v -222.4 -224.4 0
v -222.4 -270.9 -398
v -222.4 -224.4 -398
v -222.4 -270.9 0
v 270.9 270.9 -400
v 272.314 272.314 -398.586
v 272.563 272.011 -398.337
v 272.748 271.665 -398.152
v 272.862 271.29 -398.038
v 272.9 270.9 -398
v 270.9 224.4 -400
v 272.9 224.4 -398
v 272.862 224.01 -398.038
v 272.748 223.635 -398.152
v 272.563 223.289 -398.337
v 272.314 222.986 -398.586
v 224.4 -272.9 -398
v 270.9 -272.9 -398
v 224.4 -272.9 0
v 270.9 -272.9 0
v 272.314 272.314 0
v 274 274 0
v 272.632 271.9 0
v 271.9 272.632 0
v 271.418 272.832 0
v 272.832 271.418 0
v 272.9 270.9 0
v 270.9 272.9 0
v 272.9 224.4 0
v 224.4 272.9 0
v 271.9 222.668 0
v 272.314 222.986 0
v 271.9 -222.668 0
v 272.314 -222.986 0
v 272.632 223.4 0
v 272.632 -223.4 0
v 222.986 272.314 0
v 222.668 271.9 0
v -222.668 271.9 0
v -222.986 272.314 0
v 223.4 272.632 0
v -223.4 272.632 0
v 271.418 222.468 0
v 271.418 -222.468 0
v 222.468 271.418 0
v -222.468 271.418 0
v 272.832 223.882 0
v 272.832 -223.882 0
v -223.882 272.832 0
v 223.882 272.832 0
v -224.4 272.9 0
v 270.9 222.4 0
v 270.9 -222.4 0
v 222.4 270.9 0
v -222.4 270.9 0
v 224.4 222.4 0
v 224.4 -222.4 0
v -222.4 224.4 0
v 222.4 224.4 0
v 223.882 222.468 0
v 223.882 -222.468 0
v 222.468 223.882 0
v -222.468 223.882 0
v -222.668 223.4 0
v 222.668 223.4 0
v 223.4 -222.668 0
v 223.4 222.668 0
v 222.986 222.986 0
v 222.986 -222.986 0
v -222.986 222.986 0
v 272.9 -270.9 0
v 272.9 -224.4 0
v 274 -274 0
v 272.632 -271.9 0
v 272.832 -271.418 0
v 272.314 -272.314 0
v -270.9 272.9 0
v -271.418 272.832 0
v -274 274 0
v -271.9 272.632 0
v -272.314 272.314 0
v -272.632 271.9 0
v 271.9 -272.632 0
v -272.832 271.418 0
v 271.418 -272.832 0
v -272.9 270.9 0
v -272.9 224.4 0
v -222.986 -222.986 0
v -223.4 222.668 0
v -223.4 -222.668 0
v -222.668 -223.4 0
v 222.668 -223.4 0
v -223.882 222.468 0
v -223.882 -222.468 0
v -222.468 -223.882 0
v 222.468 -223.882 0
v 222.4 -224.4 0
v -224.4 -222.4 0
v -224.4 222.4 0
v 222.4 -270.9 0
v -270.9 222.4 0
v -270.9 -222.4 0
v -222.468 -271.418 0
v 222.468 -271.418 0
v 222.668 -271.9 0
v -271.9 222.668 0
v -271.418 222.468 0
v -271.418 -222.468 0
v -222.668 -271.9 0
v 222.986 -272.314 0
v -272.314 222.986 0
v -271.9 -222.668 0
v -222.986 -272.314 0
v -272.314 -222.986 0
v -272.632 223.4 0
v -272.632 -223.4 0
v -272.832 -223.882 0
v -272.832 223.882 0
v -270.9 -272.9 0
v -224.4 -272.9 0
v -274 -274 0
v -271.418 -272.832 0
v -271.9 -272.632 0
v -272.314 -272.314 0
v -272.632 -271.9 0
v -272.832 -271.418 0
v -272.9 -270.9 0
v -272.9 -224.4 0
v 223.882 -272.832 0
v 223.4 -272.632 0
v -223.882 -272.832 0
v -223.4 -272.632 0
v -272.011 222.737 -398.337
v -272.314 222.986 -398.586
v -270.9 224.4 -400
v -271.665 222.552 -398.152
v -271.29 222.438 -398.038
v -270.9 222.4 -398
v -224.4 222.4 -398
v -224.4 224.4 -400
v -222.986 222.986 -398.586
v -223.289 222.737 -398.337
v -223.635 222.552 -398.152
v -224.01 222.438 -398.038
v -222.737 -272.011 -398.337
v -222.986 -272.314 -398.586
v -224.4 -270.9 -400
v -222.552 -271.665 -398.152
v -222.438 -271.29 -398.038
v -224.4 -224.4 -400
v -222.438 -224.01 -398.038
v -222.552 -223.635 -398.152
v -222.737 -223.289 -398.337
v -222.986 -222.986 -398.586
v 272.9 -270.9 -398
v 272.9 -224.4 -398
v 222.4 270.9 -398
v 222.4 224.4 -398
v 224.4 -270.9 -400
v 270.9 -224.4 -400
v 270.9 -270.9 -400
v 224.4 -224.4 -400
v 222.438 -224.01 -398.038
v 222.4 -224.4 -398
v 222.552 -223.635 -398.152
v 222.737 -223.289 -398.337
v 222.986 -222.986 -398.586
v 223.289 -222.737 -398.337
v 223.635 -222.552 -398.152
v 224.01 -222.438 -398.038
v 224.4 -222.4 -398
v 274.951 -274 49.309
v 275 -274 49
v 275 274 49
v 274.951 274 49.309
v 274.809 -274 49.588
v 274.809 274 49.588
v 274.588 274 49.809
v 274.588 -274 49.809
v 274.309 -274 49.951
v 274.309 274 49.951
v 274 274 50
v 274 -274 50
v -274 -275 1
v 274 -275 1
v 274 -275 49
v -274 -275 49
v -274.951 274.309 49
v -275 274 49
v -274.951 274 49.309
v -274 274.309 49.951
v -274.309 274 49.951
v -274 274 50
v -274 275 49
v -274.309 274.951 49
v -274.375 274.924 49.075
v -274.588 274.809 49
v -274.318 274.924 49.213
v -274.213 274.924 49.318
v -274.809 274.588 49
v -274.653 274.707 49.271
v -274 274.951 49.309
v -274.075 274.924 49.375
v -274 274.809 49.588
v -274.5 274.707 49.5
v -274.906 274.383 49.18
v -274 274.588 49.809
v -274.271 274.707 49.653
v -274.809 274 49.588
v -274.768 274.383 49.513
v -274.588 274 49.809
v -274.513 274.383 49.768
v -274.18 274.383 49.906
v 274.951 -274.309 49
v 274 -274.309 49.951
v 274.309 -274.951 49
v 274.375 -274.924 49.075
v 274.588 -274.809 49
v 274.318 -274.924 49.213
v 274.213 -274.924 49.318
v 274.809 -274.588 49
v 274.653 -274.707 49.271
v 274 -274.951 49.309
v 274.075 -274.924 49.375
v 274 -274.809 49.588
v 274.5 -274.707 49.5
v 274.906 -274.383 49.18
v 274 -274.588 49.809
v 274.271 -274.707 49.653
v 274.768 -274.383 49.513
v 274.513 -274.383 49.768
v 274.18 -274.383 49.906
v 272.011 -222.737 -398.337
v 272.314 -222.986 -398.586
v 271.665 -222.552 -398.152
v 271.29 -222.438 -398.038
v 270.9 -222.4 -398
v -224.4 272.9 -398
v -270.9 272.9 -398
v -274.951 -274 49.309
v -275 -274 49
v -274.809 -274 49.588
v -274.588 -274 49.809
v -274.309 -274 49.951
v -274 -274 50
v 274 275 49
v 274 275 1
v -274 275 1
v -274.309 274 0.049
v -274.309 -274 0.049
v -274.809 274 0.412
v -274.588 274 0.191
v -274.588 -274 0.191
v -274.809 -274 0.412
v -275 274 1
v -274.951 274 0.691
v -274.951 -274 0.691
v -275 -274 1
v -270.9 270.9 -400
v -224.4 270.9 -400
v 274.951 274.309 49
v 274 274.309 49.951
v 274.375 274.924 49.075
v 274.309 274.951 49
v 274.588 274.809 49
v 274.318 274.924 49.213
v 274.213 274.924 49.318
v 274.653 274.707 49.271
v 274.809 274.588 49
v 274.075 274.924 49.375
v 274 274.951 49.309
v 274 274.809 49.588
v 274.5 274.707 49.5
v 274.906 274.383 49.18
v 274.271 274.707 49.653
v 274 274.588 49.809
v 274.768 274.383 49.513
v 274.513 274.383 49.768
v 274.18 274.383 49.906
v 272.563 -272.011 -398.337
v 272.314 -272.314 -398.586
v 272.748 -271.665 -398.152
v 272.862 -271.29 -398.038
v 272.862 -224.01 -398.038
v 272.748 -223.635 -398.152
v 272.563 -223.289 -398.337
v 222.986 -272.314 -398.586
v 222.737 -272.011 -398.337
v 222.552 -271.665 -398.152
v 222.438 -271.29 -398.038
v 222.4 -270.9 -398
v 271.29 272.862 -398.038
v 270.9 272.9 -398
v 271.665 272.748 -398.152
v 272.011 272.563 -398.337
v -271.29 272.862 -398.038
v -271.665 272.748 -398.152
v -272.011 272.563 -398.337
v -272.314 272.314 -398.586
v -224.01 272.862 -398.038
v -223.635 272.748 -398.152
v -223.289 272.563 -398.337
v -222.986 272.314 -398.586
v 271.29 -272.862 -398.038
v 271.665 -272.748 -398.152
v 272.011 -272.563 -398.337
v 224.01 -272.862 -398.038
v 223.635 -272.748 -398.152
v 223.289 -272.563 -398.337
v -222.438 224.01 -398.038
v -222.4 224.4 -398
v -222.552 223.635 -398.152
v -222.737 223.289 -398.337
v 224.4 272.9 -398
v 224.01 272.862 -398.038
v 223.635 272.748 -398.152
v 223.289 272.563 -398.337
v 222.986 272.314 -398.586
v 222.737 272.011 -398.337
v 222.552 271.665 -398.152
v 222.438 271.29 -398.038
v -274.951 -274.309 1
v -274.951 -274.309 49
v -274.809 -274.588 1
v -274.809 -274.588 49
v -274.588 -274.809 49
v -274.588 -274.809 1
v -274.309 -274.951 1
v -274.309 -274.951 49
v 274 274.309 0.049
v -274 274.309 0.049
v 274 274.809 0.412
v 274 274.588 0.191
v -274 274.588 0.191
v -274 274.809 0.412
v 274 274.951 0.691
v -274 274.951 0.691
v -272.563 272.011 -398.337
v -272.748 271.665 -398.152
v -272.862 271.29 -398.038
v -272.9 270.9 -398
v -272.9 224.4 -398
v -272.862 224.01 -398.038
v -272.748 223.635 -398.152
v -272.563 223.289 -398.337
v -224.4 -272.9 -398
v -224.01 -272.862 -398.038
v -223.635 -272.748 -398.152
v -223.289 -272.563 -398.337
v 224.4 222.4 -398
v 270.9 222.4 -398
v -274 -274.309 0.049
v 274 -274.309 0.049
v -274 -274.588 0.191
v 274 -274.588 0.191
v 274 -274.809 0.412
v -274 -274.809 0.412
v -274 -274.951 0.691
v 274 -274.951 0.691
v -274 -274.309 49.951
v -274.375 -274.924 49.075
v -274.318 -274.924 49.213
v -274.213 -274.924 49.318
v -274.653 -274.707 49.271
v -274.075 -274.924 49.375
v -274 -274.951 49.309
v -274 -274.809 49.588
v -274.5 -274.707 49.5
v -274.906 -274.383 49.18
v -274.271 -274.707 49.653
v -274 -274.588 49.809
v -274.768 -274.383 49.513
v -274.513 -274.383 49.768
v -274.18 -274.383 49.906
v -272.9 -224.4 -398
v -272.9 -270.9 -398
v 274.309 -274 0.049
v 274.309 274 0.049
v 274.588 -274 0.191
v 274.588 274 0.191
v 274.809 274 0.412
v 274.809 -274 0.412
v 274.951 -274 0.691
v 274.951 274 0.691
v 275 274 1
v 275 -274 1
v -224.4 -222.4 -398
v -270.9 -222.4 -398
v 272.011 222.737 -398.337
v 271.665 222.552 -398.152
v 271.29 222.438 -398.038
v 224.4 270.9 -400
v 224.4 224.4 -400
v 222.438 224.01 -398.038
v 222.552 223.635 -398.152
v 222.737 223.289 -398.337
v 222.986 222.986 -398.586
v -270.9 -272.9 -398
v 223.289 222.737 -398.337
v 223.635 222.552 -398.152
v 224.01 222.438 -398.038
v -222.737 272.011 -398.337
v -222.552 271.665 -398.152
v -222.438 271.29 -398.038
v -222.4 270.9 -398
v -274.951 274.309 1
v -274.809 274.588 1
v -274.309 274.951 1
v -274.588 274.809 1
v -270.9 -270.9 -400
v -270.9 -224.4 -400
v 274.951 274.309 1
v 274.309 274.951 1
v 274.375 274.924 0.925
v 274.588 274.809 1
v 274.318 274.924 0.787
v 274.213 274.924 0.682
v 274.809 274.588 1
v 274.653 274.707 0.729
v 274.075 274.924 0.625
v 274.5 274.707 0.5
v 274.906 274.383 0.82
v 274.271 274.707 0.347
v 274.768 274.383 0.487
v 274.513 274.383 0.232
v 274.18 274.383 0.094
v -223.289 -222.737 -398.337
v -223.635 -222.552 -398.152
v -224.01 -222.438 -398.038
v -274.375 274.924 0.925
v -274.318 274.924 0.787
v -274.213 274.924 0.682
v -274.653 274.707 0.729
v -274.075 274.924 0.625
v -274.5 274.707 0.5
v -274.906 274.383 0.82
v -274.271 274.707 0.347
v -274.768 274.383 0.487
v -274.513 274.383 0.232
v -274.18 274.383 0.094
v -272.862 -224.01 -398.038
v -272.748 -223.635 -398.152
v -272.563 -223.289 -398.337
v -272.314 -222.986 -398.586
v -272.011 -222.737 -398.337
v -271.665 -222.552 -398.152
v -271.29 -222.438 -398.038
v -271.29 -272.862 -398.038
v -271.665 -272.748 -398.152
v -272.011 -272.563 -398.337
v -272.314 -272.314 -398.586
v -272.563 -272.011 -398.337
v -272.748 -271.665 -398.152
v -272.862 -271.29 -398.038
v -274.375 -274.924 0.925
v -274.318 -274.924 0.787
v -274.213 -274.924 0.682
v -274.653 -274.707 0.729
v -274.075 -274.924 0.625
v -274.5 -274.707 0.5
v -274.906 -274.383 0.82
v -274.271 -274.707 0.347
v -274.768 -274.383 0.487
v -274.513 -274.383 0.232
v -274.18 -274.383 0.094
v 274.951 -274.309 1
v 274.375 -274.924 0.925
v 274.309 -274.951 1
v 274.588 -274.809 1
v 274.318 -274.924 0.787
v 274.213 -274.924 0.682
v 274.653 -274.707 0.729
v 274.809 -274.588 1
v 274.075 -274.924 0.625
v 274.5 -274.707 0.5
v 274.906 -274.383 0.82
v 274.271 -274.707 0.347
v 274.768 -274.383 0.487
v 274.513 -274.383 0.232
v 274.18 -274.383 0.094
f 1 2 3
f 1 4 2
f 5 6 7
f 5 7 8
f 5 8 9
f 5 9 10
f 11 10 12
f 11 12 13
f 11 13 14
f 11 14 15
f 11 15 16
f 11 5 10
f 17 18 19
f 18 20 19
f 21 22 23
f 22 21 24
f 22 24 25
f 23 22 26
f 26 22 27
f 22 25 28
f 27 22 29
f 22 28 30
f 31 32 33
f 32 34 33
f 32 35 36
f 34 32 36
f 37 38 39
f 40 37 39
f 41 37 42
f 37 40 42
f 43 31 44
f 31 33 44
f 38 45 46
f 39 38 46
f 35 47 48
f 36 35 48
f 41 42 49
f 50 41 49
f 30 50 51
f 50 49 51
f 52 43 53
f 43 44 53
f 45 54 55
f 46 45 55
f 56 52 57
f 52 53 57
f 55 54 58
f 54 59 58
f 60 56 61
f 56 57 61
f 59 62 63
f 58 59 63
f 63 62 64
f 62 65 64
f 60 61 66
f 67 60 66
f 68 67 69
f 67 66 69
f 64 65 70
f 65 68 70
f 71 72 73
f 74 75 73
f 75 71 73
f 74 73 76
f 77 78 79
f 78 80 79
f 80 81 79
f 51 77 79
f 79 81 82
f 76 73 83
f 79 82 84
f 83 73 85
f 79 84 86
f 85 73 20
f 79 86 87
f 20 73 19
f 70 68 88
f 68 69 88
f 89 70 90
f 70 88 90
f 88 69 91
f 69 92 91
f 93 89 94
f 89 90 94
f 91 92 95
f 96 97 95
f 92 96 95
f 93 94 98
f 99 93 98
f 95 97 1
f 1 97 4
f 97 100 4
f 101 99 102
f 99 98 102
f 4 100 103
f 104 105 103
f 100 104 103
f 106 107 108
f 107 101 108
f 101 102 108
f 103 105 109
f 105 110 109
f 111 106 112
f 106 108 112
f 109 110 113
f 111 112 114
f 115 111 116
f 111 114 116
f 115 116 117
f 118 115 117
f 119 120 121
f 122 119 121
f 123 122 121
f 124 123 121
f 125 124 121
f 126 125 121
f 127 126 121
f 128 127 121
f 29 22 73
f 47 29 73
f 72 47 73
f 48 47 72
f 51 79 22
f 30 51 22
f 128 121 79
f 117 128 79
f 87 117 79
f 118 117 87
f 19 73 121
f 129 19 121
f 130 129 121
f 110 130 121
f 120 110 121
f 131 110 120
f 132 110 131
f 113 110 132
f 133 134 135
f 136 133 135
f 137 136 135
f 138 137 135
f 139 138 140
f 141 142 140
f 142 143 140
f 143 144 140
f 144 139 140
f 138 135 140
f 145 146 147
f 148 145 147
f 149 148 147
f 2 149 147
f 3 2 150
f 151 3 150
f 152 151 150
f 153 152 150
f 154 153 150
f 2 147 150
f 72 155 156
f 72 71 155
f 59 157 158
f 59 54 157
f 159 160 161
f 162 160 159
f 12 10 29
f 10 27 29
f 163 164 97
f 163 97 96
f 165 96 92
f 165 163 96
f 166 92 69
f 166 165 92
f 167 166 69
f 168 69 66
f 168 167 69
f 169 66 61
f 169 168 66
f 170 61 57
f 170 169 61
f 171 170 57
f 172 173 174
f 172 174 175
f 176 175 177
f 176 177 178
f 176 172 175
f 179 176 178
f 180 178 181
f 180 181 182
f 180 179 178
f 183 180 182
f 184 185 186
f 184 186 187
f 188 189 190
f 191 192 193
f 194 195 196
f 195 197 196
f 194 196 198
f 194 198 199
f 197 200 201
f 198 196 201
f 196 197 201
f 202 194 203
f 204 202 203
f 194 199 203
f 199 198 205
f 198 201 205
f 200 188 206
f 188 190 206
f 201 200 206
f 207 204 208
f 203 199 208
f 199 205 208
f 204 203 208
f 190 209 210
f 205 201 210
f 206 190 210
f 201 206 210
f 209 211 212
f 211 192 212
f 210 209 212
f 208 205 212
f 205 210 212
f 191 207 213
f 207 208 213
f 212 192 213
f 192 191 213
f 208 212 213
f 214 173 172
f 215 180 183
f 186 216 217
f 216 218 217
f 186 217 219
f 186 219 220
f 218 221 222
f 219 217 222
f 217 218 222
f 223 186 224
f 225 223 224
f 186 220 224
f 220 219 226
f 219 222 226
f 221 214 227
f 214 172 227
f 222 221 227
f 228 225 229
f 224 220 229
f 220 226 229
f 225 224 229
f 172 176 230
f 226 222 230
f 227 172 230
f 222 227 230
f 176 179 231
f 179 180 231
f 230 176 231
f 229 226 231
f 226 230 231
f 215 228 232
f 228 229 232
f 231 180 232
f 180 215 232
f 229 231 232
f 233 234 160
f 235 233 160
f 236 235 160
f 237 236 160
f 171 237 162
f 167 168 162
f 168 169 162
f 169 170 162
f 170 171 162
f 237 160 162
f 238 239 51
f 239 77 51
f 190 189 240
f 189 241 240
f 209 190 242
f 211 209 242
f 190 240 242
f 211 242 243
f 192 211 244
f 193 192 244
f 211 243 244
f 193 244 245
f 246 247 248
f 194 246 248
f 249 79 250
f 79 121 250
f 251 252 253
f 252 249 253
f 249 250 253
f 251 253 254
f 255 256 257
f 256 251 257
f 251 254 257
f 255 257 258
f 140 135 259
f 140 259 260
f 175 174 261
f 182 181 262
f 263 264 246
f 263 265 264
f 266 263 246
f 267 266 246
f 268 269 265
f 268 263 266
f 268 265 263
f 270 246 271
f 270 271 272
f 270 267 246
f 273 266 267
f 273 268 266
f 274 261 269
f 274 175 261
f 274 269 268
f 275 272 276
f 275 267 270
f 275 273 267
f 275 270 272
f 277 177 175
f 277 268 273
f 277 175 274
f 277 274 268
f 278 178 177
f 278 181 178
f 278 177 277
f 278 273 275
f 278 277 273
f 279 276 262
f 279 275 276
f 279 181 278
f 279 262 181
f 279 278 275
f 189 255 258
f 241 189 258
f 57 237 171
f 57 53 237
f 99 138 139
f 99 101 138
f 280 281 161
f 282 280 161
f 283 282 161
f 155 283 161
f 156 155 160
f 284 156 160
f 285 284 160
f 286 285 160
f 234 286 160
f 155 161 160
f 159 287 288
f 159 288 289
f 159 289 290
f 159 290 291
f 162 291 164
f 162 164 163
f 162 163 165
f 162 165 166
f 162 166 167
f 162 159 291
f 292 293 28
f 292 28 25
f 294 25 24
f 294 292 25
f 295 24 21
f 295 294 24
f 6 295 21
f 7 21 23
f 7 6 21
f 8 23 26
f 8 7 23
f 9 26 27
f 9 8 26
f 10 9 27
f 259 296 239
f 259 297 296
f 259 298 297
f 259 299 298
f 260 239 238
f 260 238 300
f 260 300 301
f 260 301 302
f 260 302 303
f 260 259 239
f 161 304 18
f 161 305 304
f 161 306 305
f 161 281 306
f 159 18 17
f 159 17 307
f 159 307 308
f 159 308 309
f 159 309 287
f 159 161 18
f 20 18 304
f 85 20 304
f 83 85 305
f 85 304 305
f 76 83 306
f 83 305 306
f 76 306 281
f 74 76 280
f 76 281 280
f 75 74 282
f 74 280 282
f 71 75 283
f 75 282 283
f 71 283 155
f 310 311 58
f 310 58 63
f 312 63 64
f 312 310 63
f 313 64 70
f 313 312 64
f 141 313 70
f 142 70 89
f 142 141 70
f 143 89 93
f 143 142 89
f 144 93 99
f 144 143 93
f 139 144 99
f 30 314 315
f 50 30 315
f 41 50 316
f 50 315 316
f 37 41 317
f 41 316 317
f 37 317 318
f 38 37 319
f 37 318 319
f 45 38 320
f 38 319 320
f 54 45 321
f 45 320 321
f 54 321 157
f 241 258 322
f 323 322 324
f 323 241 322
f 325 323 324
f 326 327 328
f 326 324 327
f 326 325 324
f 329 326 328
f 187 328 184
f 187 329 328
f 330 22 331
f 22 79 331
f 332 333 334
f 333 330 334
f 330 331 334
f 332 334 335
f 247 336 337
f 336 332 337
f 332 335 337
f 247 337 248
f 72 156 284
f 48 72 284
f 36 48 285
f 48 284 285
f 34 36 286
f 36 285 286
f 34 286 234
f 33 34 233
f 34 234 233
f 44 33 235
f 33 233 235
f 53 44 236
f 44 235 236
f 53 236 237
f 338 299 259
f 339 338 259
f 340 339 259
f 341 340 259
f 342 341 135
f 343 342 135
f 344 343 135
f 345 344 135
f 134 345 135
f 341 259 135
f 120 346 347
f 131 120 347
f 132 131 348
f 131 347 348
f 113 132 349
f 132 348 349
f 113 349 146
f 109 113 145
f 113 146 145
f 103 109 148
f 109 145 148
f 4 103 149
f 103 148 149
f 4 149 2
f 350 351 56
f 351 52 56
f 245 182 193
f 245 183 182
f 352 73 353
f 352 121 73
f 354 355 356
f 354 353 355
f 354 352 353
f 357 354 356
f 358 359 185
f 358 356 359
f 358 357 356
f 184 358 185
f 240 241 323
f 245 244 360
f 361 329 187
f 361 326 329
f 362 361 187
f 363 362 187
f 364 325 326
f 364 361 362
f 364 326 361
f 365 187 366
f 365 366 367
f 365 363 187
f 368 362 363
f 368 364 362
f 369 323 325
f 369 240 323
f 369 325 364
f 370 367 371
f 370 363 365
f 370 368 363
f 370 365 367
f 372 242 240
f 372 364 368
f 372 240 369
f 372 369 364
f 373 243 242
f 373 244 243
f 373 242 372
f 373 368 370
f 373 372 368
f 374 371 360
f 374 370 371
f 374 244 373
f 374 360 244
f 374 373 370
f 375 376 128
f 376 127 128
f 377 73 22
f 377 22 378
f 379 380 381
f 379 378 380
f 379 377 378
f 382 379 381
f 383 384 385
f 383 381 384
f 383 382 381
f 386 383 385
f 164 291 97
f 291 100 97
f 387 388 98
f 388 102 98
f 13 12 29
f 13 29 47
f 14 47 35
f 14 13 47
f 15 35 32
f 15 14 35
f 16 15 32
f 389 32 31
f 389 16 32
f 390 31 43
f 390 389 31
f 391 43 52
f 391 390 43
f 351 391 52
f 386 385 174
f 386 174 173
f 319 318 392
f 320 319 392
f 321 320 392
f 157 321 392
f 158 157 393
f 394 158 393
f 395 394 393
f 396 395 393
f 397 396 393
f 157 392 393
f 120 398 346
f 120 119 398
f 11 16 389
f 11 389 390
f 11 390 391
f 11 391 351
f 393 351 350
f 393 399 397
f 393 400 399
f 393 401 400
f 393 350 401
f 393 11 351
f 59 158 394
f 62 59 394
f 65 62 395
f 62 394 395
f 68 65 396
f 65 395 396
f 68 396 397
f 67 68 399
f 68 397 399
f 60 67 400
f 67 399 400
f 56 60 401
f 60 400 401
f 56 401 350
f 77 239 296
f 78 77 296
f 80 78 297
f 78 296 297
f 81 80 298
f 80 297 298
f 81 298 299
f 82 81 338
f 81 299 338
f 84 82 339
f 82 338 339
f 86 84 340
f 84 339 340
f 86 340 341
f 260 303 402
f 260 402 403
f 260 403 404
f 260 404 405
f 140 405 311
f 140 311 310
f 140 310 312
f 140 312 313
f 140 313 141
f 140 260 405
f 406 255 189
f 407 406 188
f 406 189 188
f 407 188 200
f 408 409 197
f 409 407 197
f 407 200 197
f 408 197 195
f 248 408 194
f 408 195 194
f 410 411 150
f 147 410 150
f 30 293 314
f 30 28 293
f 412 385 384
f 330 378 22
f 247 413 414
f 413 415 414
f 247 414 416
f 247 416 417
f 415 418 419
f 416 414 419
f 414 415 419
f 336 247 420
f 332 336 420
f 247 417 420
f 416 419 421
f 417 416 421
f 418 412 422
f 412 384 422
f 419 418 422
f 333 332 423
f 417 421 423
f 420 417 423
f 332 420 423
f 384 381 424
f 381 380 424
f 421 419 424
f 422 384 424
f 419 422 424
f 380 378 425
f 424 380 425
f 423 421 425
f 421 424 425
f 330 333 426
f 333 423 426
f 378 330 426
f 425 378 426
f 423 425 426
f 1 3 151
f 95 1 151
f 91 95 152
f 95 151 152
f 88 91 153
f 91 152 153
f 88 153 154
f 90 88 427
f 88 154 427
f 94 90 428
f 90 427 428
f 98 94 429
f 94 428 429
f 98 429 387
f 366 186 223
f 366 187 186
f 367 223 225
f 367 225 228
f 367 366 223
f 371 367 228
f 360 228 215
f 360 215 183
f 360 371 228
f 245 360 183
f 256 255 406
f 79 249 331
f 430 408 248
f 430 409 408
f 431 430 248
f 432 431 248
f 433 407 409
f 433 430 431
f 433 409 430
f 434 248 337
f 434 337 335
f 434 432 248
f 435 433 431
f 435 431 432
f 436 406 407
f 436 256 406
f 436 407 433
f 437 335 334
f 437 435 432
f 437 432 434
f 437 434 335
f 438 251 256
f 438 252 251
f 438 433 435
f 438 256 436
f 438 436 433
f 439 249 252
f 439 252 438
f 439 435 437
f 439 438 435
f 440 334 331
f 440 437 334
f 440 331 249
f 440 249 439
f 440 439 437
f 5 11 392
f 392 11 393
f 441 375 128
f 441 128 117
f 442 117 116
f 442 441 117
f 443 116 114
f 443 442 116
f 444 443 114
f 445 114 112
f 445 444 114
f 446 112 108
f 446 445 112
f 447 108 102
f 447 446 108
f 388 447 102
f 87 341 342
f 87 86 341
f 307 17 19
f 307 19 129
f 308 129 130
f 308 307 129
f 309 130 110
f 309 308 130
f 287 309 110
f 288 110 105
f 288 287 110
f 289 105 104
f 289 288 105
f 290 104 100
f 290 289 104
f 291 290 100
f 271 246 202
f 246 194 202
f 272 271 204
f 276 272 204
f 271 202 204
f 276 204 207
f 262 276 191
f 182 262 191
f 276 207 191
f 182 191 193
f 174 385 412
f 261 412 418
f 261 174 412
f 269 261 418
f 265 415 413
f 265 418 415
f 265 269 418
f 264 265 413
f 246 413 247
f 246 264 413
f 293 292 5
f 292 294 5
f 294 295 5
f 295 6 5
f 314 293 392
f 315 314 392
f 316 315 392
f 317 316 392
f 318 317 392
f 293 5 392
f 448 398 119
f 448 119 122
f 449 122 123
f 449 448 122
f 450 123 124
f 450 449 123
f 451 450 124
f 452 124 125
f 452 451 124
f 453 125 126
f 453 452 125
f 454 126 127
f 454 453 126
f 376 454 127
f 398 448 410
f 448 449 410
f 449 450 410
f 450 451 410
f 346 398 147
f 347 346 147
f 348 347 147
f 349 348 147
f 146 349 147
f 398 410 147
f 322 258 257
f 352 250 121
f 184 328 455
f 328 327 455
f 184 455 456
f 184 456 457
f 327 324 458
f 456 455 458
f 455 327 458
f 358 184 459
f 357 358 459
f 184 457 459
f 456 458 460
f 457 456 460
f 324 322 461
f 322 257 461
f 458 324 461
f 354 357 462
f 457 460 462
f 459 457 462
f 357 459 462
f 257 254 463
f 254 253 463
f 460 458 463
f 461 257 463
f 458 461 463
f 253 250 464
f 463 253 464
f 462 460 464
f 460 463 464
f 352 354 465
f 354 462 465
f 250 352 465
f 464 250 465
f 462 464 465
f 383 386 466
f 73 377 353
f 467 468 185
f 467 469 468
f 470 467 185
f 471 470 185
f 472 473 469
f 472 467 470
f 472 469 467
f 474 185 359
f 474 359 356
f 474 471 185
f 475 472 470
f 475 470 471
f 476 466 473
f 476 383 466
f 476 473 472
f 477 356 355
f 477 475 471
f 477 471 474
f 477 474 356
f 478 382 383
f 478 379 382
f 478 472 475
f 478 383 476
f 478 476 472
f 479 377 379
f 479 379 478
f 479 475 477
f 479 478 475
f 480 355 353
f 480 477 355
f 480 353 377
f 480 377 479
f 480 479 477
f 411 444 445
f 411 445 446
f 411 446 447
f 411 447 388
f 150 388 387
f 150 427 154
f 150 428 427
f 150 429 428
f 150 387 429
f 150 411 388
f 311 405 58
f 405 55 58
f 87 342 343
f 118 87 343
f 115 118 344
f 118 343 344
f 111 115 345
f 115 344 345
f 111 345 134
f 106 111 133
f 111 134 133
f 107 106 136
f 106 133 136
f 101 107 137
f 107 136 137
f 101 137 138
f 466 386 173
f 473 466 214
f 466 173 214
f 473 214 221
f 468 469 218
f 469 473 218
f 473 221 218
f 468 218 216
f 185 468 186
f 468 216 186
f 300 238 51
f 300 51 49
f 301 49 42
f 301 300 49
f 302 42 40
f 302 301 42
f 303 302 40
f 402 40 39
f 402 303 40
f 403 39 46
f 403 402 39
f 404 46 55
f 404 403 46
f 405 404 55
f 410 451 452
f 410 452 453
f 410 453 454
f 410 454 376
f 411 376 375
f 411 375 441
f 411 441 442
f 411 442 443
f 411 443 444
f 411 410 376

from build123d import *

# Parameters (mm, degrees)
F0_W     = 275
F0_H     = 275
F0_W_2   = 50.5
F0_H_2   = 50.5
F1_DEPTH = 50
F2_DEPTH = 400
F3_SIZE  = 2
F4_R     = 2
F5_R     = 1


with BuildPart() as f1:
    # F0 (on Top) → F1 (new body)
    with BuildSketch(Plane.XY):
        with Locations((-137.5, -137.5)):
            Rectangle(F0_W, F0_H)
        with Locations((-247.65, -247.65)):
            Rectangle(F0_W_2, F0_H_2, mode=Mode.SUBTRACT)
        with Locations((-247.65, -247.65)):
            Rectangle(F0_W_2, F0_H_2)
    extrude(amount=F1_DEPTH)

    # F0 (on Top) → F2 (join)
    with BuildSketch(Plane.XY):
        with Locations((-247.65, -247.65)):
            Rectangle(F0_W_2, F0_H_2)
    extrude(amount=-F2_DEPTH)

    # F3
    f3_edges = [f1.edges().sort_by_distance(p)[0] for p in [
        (-272.9, -247.65, -400),
        (-247.65, -272.9, -400),
        (-222.4, -247.65, -400),
        (-247.65, -222.4, -400),
    ]]
    chamfer(f3_edges, length=F3_SIZE)

    # F4
    f4_edges = [f1.edges().sort_by_distance(p)[0] for p in [
        (-272.9, -272.9, -199),
        (-222.4, -272.9, -199),
        (-272.9, -222.4, -199),
        (-222.4, -222.4, -199),
    ]]
    fillet(f4_edges, radius=F4_R)

    # F5
    f5_edges = [f1.edges().sort_by_distance(p)[0] for p in [
        (-275, -137.5, 50),
        (-275, -137.5, 0),
        (-275, -275, 25),
        (-137.5, -275, 50),
        (-137.5, -275, 0),
    ]]
    fillet(f5_edges, radius=F5_R)

    # F6: F1 across face


with BuildPart() as f1_1:
    add(f1.part)
    add(f1.part.mirror(Plane(origin=(0, -137.4957148019, 25), x_dir=(0, 1, 0), z_dir=(1, 0, 0))))

    # F7: F1 across face


with BuildPart() as f1_2:
    add(f1_1.part)
    add(f1_1.part.mirror(Plane(origin=(0, 0, 25), x_dir=(-1, 0, 0), z_dir=(0, 1, 0))))


solid = f1_2.part
